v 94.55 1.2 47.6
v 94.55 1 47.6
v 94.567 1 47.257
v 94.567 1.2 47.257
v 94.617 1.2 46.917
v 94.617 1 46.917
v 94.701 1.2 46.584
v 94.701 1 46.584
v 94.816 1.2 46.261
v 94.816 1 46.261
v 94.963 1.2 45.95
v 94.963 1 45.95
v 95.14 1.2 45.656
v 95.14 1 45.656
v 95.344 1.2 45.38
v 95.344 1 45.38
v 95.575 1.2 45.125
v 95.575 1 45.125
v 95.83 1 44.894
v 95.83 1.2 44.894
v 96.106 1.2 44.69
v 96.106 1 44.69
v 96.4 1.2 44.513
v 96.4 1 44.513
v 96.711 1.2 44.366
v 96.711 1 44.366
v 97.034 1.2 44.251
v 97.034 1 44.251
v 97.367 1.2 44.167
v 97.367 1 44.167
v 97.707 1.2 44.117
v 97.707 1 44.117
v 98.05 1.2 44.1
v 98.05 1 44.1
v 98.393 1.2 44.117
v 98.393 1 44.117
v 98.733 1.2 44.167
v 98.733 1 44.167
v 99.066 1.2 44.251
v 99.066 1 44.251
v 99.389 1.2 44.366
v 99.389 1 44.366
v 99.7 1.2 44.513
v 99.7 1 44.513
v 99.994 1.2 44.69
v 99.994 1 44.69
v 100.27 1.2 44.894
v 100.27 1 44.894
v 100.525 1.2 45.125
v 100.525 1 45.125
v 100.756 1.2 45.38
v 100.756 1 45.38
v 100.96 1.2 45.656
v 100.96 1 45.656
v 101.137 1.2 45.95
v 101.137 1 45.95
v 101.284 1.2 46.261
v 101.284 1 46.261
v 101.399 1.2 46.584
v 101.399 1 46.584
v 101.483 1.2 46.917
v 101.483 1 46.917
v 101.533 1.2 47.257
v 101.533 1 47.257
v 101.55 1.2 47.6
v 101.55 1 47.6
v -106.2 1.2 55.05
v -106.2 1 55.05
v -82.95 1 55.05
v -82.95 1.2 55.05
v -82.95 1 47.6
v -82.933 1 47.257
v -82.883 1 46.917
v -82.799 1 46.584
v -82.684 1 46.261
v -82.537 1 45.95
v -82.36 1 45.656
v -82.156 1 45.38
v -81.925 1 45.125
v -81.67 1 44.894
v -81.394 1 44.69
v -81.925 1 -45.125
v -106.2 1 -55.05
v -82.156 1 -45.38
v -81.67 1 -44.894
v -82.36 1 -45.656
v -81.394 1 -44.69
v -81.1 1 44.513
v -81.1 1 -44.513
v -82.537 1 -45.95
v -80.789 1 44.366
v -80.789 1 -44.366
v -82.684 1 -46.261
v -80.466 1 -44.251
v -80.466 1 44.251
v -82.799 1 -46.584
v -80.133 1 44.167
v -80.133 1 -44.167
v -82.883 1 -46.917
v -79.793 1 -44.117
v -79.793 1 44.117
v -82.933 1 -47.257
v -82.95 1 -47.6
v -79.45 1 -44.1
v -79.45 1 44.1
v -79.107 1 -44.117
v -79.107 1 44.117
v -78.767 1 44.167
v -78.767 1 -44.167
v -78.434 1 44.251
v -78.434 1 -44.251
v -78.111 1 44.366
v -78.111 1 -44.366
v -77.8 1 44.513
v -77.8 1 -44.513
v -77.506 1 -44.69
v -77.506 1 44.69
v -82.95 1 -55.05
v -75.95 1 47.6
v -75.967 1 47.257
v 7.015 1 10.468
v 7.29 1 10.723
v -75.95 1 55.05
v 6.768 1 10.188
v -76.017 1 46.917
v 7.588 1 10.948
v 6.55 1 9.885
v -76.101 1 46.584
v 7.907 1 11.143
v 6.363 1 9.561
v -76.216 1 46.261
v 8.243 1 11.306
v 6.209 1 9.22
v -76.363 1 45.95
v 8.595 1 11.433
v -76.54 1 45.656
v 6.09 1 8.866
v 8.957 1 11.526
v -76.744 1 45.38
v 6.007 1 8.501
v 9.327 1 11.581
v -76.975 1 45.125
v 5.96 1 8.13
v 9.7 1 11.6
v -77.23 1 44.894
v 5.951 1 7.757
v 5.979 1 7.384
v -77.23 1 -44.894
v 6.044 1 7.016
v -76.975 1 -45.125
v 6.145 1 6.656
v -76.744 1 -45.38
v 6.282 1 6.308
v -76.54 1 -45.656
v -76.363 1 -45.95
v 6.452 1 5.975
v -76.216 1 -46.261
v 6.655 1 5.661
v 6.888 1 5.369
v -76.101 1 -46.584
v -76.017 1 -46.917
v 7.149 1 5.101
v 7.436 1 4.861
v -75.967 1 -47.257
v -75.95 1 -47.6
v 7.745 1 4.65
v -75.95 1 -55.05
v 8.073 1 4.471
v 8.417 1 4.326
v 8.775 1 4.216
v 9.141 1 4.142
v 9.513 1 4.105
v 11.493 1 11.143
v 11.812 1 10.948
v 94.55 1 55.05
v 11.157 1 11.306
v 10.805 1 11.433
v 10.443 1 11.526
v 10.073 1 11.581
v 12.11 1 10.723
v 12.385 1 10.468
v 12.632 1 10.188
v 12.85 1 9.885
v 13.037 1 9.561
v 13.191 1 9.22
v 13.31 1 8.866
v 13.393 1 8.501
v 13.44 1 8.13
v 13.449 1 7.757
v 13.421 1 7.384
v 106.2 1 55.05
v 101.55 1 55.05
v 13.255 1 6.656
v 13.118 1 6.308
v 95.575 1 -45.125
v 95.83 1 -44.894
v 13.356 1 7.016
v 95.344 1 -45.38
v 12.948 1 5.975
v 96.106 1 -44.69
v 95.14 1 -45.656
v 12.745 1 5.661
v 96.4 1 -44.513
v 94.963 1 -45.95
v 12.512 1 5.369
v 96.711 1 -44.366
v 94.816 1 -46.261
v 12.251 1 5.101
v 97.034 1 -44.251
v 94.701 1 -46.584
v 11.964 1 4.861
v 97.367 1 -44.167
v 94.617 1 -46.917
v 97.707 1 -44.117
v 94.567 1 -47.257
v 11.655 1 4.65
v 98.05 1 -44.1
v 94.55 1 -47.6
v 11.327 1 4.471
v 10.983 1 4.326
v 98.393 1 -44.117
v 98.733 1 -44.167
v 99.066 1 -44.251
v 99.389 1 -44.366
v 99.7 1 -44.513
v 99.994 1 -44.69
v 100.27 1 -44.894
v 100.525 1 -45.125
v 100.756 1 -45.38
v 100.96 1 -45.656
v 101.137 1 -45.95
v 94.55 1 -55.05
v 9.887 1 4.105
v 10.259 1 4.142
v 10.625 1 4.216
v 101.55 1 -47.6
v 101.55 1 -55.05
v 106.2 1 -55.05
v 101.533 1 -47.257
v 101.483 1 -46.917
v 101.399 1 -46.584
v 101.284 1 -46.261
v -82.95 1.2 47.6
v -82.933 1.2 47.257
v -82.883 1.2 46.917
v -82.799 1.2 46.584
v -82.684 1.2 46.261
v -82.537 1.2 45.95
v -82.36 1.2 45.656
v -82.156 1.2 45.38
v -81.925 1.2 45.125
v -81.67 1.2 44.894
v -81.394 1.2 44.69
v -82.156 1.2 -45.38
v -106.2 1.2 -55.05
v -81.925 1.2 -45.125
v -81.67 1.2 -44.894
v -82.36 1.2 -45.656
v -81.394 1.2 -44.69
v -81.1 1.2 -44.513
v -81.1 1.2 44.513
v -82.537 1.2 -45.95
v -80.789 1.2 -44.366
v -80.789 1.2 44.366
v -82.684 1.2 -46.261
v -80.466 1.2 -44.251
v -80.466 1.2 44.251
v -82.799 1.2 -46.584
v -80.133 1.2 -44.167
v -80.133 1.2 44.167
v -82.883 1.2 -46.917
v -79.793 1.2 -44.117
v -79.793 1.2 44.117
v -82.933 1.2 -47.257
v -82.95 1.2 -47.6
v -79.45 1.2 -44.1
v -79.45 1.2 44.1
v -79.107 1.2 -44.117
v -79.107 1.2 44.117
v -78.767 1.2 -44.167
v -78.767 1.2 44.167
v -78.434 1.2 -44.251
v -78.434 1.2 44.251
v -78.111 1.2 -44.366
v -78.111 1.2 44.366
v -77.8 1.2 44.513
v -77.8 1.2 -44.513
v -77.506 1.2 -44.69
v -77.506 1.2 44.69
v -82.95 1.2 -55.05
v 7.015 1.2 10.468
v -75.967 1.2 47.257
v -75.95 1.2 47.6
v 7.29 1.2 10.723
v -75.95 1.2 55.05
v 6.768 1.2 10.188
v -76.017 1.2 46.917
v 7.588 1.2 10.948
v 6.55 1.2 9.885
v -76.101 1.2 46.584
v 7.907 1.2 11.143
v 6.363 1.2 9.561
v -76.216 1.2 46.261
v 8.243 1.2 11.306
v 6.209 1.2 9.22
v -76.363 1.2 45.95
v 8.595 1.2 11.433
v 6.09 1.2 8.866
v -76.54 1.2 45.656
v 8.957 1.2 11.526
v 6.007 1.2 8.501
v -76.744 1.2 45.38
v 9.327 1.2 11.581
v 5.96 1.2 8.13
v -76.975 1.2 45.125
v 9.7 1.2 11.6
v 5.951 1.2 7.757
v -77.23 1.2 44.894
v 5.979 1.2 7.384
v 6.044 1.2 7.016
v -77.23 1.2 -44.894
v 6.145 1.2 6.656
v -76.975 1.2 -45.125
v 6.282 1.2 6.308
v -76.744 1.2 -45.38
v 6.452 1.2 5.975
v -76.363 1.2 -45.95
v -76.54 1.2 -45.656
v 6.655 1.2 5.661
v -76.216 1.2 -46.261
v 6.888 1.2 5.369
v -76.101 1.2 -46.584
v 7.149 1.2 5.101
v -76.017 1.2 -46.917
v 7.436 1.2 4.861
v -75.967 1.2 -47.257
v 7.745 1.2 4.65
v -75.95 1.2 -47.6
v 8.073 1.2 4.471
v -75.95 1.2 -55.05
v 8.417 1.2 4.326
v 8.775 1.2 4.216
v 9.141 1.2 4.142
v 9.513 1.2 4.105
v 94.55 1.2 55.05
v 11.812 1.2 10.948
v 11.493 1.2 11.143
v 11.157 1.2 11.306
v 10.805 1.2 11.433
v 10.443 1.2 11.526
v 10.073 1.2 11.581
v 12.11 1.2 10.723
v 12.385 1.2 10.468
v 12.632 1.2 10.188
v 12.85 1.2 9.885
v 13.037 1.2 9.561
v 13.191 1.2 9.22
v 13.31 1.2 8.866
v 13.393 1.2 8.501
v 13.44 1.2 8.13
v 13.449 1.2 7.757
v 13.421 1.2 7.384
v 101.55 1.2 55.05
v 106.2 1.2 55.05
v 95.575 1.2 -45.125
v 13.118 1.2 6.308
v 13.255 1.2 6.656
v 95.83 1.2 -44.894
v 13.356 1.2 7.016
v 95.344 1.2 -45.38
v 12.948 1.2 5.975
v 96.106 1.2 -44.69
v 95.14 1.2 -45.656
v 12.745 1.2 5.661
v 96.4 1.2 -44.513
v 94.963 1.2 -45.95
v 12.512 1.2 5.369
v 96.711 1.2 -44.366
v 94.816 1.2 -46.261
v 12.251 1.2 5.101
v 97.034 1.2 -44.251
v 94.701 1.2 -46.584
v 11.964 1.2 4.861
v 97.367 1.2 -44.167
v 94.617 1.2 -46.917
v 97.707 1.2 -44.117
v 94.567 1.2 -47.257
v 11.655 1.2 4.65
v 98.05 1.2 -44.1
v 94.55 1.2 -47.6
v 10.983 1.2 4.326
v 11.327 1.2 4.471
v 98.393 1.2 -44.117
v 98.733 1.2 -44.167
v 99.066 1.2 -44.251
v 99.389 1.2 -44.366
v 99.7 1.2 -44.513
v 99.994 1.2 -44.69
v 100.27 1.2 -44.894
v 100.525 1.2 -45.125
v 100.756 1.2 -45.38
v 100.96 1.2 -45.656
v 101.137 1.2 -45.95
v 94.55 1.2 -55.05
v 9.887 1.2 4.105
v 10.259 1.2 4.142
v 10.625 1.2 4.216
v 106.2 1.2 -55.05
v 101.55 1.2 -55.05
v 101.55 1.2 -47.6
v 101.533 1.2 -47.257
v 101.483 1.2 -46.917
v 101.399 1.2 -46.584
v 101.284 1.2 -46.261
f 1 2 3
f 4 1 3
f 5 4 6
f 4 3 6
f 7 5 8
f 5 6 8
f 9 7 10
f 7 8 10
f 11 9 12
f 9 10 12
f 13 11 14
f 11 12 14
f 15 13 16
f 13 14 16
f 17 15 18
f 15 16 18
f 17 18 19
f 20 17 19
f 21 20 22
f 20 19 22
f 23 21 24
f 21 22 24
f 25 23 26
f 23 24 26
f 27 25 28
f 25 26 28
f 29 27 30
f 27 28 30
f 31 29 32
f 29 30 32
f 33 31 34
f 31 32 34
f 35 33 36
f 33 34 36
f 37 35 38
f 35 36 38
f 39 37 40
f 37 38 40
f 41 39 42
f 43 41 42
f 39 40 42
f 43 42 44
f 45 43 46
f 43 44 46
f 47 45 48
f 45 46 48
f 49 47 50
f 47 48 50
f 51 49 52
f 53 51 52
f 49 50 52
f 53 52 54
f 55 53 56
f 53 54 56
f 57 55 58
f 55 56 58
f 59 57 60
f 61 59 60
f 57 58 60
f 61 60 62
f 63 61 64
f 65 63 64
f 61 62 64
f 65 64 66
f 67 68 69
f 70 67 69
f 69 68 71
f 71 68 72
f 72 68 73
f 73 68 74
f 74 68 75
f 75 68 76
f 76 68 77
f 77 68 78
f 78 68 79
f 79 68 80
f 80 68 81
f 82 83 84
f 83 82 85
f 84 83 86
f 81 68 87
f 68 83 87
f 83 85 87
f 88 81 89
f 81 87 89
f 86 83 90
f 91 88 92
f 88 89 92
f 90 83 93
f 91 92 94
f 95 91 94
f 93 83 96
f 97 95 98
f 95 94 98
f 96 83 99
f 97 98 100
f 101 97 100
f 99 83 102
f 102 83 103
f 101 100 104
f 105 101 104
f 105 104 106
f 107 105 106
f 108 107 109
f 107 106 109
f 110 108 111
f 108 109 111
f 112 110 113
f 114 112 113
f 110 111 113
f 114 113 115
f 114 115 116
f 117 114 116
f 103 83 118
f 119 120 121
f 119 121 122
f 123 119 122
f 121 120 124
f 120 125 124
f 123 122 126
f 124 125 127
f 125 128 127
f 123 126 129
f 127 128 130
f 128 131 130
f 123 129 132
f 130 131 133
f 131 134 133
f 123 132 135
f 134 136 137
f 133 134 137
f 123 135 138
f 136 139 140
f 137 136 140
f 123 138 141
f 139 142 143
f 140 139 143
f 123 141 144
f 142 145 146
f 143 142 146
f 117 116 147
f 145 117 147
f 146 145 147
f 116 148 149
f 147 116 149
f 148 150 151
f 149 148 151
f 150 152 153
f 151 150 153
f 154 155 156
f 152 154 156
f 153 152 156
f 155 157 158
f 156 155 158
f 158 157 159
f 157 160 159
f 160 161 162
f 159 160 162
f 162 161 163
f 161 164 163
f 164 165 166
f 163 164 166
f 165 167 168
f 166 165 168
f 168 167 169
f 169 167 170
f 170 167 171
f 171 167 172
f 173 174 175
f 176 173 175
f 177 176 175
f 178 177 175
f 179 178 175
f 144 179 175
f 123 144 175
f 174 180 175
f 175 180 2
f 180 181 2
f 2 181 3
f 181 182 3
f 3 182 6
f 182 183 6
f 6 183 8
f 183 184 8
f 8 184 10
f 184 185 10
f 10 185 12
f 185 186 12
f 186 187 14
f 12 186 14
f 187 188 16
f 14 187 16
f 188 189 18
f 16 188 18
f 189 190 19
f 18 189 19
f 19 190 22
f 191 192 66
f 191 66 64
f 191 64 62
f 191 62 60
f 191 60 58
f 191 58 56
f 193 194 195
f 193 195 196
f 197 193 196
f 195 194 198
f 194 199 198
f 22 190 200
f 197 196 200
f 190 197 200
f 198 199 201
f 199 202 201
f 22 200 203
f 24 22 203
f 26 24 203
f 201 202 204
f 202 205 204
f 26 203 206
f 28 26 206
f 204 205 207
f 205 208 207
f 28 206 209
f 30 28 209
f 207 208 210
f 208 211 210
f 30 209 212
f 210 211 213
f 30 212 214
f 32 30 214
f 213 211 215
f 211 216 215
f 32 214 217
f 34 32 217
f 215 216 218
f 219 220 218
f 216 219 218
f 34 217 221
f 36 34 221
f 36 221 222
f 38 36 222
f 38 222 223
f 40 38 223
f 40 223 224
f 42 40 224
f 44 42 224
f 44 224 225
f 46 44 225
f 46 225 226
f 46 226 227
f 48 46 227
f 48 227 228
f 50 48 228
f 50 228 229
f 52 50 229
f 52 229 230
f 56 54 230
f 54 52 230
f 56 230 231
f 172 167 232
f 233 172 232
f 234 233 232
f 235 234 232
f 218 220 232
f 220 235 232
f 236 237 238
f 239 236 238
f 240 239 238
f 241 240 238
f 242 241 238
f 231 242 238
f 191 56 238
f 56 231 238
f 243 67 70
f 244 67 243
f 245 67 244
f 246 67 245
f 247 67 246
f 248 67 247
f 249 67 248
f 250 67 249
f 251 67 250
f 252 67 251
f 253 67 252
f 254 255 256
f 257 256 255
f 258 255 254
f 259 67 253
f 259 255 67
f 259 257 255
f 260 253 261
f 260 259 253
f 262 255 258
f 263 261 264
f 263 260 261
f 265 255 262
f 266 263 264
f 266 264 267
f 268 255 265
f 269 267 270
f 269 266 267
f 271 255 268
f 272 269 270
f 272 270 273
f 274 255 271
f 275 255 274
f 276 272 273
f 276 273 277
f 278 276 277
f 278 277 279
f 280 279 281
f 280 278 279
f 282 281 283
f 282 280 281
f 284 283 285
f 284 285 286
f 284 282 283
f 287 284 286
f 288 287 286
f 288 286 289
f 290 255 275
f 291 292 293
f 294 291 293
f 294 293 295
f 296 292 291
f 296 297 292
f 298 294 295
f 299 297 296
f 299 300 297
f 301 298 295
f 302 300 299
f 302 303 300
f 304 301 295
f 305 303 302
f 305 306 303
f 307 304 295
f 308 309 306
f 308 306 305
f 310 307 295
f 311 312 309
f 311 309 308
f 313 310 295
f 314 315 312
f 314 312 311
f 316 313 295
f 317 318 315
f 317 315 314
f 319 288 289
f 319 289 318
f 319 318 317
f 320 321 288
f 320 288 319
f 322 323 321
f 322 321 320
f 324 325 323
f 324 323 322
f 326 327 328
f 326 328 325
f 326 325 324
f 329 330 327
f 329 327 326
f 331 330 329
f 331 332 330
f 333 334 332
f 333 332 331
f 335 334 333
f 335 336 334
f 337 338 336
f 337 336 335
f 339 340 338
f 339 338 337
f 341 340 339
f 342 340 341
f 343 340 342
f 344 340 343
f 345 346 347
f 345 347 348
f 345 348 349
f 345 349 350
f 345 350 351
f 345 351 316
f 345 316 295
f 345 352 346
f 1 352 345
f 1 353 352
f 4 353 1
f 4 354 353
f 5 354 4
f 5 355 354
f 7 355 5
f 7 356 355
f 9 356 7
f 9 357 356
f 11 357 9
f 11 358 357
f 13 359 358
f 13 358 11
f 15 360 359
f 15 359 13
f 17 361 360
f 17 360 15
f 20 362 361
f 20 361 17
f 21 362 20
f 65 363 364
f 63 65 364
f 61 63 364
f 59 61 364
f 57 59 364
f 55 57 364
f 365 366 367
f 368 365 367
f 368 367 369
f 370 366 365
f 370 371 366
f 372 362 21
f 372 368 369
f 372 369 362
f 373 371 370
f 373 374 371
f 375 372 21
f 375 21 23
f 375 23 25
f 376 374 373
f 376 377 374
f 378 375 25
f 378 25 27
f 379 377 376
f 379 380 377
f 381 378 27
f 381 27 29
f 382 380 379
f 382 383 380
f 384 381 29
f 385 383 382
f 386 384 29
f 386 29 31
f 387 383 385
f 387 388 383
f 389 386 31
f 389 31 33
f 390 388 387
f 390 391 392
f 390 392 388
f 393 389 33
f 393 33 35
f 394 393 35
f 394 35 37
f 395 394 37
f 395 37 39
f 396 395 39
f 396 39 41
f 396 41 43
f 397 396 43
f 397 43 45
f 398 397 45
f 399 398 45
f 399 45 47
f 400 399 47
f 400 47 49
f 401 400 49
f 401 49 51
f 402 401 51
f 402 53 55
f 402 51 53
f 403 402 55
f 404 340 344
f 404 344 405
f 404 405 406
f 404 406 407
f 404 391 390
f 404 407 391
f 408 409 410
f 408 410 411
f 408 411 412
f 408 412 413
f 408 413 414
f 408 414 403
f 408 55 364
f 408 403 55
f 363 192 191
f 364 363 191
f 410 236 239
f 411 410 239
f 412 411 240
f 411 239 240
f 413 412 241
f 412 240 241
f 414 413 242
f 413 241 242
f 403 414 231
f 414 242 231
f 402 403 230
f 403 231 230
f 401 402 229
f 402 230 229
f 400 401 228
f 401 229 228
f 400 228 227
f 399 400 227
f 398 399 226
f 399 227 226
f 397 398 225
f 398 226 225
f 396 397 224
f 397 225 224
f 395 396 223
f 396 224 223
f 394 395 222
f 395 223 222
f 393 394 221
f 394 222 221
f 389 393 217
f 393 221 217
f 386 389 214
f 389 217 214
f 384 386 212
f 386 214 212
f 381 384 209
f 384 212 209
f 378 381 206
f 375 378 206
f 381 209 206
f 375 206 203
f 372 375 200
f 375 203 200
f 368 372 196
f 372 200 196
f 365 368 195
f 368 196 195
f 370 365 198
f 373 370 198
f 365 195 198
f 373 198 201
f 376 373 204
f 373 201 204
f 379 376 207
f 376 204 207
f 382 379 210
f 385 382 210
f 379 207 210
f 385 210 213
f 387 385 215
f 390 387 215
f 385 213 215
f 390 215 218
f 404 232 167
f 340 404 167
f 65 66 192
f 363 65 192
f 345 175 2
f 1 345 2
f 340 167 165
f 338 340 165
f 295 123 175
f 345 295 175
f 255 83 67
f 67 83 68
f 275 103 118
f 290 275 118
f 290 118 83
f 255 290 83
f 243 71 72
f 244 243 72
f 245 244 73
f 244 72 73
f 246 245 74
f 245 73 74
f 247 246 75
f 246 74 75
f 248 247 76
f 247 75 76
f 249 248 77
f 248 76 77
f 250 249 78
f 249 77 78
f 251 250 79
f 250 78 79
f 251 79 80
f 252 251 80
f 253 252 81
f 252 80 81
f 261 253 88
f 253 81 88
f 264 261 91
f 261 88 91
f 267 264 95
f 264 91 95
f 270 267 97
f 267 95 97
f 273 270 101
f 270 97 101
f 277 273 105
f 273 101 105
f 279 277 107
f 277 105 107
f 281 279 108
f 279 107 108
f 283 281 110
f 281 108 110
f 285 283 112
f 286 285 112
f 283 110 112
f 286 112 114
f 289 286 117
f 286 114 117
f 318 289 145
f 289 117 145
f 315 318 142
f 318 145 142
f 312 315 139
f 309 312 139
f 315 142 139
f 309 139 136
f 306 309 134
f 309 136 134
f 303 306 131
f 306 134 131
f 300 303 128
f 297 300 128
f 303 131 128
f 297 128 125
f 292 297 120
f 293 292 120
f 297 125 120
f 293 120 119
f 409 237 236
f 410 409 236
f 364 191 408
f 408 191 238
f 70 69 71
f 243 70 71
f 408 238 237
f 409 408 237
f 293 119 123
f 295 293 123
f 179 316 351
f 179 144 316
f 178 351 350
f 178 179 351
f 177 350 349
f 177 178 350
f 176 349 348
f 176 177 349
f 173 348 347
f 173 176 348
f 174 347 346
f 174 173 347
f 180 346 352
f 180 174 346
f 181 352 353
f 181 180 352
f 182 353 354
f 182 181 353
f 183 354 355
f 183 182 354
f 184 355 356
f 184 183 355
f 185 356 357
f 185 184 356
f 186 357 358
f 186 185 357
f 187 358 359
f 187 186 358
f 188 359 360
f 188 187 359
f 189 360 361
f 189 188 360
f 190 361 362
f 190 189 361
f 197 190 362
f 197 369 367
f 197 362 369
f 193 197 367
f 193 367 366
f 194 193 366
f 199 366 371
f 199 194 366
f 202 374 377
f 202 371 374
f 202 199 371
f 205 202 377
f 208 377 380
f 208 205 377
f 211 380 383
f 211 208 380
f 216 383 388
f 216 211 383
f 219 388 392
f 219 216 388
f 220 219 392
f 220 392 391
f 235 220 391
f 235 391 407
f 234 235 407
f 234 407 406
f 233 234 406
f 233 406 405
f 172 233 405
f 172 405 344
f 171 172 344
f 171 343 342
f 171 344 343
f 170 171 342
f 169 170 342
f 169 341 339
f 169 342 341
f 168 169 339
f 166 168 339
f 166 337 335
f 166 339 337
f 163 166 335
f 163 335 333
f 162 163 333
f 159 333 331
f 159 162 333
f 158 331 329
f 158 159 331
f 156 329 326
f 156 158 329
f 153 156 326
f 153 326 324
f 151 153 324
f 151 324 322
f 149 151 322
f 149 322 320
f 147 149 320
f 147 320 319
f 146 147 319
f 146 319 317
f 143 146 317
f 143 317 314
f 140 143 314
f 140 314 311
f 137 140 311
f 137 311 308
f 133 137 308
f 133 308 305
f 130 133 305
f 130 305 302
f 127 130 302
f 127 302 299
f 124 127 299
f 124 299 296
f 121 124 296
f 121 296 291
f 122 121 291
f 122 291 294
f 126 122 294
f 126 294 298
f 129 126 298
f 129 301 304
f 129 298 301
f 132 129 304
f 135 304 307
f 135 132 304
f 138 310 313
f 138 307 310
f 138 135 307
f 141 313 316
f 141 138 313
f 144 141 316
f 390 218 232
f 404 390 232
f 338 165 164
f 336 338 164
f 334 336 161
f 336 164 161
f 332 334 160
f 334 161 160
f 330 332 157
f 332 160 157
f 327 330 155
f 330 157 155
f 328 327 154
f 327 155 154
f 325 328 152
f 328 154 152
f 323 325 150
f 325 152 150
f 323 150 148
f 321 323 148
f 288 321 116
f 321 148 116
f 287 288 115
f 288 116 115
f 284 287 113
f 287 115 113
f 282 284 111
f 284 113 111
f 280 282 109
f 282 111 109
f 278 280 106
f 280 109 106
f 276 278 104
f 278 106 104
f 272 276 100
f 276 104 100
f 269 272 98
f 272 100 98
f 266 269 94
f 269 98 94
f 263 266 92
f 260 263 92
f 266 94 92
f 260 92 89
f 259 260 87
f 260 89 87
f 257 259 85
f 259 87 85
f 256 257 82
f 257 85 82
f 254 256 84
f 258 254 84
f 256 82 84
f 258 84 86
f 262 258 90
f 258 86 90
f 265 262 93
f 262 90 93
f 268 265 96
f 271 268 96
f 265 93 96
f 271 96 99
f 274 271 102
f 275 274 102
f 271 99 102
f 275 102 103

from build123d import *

# Parameters (mm, degrees)
STOCK_BOTTOM_START        = 1
STOCK_BOTTOM_CASE_1_DEPTH = 0.2
CUT_EXTRUDE1_DEPTH        = 120.620159254
CUT_EXTRUDE1_DEPTH_BACK   = 120.620159254
SKETCH1_R                 = 3.75


# Read off the part's stored shape, not the designer's step: Stock-Bottom case-1
with BuildPart() as part:
    # Stock-Bottom case-1 outline → Stock-Bottom case-1 (new body)
    with BuildSketch(Plane(origin=(0, 0, 0), x_dir=(1, 0, 0), z_dir=(0, 1, 0)).offset(STOCK_BOTTOM_START)):
        with BuildLine():
            Line((94.55, 55.05), (-75.95, 55.05))
            Line((-75.95, 55.05), (-75.95, 47.6))
            ThreePointArc((-75.95, 47.6), (-79.45, 44.1), (-82.95, 47.6))
            Line((-82.95, 47.6), (-82.95, 55.05))
            Line((-82.95, 55.05), (-106.2, 55.05))
            Line((-106.2, 55.05), (-106.2, -55.05))
            Line((-106.2, -55.05), (-82.95, -55.05))
            Line((-82.95, -55.05), (-82.95, -47.6))
            ThreePointArc((-82.95, -47.6), (-79.45, -44.1), (-75.95, -47.6))
            Line((-75.95, -47.6), (-75.95, -55.05))
            Line((-75.95, -55.05), (94.55, -55.05))
            Line((94.55, -55.05), (94.55, -47.6))
            ThreePointArc((94.55, -47.6), (98.05, -44.1), (101.55, -47.6))
            Line((101.55, -47.6), (101.55, -55.05))
            Line((101.55, -55.05), (106.2, -55.05))
            Line((106.2, -55.05), (106.2, 55.05))
            Line((106.2, 55.05), (101.55, 55.05))
            Line((101.55, 55.05), (101.55, 47.6))
            ThreePointArc((101.55, 47.6), (98.05, 44.1), (94.55, 47.6))
            Line((94.55, 47.6), (94.55, 55.05))
        make_face()
    extrude(amount=STOCK_BOTTOM_CASE_1_DEPTH)

    # Sketch1 → Cut-Extrude1 (cut, two sides: drawn at the far end of the back side and taken through both)
    with BuildSketch(Plane(origin=(0, 1.2, 0), x_dir=(1, 0, 0), z_dir=(0, 1, 0)).offset(-CUT_EXTRUDE1_DEPTH_BACK)):
        with Locations(Location((9.7, -7.85, 0), (0, 0, 270))):
            Circle(SKETCH1_R)
    extrude(amount=CUT_EXTRUDE1_DEPTH + CUT_EXTRUDE1_DEPTH_BACK, mode=Mode.SUBTRACT)


solid = part.part
